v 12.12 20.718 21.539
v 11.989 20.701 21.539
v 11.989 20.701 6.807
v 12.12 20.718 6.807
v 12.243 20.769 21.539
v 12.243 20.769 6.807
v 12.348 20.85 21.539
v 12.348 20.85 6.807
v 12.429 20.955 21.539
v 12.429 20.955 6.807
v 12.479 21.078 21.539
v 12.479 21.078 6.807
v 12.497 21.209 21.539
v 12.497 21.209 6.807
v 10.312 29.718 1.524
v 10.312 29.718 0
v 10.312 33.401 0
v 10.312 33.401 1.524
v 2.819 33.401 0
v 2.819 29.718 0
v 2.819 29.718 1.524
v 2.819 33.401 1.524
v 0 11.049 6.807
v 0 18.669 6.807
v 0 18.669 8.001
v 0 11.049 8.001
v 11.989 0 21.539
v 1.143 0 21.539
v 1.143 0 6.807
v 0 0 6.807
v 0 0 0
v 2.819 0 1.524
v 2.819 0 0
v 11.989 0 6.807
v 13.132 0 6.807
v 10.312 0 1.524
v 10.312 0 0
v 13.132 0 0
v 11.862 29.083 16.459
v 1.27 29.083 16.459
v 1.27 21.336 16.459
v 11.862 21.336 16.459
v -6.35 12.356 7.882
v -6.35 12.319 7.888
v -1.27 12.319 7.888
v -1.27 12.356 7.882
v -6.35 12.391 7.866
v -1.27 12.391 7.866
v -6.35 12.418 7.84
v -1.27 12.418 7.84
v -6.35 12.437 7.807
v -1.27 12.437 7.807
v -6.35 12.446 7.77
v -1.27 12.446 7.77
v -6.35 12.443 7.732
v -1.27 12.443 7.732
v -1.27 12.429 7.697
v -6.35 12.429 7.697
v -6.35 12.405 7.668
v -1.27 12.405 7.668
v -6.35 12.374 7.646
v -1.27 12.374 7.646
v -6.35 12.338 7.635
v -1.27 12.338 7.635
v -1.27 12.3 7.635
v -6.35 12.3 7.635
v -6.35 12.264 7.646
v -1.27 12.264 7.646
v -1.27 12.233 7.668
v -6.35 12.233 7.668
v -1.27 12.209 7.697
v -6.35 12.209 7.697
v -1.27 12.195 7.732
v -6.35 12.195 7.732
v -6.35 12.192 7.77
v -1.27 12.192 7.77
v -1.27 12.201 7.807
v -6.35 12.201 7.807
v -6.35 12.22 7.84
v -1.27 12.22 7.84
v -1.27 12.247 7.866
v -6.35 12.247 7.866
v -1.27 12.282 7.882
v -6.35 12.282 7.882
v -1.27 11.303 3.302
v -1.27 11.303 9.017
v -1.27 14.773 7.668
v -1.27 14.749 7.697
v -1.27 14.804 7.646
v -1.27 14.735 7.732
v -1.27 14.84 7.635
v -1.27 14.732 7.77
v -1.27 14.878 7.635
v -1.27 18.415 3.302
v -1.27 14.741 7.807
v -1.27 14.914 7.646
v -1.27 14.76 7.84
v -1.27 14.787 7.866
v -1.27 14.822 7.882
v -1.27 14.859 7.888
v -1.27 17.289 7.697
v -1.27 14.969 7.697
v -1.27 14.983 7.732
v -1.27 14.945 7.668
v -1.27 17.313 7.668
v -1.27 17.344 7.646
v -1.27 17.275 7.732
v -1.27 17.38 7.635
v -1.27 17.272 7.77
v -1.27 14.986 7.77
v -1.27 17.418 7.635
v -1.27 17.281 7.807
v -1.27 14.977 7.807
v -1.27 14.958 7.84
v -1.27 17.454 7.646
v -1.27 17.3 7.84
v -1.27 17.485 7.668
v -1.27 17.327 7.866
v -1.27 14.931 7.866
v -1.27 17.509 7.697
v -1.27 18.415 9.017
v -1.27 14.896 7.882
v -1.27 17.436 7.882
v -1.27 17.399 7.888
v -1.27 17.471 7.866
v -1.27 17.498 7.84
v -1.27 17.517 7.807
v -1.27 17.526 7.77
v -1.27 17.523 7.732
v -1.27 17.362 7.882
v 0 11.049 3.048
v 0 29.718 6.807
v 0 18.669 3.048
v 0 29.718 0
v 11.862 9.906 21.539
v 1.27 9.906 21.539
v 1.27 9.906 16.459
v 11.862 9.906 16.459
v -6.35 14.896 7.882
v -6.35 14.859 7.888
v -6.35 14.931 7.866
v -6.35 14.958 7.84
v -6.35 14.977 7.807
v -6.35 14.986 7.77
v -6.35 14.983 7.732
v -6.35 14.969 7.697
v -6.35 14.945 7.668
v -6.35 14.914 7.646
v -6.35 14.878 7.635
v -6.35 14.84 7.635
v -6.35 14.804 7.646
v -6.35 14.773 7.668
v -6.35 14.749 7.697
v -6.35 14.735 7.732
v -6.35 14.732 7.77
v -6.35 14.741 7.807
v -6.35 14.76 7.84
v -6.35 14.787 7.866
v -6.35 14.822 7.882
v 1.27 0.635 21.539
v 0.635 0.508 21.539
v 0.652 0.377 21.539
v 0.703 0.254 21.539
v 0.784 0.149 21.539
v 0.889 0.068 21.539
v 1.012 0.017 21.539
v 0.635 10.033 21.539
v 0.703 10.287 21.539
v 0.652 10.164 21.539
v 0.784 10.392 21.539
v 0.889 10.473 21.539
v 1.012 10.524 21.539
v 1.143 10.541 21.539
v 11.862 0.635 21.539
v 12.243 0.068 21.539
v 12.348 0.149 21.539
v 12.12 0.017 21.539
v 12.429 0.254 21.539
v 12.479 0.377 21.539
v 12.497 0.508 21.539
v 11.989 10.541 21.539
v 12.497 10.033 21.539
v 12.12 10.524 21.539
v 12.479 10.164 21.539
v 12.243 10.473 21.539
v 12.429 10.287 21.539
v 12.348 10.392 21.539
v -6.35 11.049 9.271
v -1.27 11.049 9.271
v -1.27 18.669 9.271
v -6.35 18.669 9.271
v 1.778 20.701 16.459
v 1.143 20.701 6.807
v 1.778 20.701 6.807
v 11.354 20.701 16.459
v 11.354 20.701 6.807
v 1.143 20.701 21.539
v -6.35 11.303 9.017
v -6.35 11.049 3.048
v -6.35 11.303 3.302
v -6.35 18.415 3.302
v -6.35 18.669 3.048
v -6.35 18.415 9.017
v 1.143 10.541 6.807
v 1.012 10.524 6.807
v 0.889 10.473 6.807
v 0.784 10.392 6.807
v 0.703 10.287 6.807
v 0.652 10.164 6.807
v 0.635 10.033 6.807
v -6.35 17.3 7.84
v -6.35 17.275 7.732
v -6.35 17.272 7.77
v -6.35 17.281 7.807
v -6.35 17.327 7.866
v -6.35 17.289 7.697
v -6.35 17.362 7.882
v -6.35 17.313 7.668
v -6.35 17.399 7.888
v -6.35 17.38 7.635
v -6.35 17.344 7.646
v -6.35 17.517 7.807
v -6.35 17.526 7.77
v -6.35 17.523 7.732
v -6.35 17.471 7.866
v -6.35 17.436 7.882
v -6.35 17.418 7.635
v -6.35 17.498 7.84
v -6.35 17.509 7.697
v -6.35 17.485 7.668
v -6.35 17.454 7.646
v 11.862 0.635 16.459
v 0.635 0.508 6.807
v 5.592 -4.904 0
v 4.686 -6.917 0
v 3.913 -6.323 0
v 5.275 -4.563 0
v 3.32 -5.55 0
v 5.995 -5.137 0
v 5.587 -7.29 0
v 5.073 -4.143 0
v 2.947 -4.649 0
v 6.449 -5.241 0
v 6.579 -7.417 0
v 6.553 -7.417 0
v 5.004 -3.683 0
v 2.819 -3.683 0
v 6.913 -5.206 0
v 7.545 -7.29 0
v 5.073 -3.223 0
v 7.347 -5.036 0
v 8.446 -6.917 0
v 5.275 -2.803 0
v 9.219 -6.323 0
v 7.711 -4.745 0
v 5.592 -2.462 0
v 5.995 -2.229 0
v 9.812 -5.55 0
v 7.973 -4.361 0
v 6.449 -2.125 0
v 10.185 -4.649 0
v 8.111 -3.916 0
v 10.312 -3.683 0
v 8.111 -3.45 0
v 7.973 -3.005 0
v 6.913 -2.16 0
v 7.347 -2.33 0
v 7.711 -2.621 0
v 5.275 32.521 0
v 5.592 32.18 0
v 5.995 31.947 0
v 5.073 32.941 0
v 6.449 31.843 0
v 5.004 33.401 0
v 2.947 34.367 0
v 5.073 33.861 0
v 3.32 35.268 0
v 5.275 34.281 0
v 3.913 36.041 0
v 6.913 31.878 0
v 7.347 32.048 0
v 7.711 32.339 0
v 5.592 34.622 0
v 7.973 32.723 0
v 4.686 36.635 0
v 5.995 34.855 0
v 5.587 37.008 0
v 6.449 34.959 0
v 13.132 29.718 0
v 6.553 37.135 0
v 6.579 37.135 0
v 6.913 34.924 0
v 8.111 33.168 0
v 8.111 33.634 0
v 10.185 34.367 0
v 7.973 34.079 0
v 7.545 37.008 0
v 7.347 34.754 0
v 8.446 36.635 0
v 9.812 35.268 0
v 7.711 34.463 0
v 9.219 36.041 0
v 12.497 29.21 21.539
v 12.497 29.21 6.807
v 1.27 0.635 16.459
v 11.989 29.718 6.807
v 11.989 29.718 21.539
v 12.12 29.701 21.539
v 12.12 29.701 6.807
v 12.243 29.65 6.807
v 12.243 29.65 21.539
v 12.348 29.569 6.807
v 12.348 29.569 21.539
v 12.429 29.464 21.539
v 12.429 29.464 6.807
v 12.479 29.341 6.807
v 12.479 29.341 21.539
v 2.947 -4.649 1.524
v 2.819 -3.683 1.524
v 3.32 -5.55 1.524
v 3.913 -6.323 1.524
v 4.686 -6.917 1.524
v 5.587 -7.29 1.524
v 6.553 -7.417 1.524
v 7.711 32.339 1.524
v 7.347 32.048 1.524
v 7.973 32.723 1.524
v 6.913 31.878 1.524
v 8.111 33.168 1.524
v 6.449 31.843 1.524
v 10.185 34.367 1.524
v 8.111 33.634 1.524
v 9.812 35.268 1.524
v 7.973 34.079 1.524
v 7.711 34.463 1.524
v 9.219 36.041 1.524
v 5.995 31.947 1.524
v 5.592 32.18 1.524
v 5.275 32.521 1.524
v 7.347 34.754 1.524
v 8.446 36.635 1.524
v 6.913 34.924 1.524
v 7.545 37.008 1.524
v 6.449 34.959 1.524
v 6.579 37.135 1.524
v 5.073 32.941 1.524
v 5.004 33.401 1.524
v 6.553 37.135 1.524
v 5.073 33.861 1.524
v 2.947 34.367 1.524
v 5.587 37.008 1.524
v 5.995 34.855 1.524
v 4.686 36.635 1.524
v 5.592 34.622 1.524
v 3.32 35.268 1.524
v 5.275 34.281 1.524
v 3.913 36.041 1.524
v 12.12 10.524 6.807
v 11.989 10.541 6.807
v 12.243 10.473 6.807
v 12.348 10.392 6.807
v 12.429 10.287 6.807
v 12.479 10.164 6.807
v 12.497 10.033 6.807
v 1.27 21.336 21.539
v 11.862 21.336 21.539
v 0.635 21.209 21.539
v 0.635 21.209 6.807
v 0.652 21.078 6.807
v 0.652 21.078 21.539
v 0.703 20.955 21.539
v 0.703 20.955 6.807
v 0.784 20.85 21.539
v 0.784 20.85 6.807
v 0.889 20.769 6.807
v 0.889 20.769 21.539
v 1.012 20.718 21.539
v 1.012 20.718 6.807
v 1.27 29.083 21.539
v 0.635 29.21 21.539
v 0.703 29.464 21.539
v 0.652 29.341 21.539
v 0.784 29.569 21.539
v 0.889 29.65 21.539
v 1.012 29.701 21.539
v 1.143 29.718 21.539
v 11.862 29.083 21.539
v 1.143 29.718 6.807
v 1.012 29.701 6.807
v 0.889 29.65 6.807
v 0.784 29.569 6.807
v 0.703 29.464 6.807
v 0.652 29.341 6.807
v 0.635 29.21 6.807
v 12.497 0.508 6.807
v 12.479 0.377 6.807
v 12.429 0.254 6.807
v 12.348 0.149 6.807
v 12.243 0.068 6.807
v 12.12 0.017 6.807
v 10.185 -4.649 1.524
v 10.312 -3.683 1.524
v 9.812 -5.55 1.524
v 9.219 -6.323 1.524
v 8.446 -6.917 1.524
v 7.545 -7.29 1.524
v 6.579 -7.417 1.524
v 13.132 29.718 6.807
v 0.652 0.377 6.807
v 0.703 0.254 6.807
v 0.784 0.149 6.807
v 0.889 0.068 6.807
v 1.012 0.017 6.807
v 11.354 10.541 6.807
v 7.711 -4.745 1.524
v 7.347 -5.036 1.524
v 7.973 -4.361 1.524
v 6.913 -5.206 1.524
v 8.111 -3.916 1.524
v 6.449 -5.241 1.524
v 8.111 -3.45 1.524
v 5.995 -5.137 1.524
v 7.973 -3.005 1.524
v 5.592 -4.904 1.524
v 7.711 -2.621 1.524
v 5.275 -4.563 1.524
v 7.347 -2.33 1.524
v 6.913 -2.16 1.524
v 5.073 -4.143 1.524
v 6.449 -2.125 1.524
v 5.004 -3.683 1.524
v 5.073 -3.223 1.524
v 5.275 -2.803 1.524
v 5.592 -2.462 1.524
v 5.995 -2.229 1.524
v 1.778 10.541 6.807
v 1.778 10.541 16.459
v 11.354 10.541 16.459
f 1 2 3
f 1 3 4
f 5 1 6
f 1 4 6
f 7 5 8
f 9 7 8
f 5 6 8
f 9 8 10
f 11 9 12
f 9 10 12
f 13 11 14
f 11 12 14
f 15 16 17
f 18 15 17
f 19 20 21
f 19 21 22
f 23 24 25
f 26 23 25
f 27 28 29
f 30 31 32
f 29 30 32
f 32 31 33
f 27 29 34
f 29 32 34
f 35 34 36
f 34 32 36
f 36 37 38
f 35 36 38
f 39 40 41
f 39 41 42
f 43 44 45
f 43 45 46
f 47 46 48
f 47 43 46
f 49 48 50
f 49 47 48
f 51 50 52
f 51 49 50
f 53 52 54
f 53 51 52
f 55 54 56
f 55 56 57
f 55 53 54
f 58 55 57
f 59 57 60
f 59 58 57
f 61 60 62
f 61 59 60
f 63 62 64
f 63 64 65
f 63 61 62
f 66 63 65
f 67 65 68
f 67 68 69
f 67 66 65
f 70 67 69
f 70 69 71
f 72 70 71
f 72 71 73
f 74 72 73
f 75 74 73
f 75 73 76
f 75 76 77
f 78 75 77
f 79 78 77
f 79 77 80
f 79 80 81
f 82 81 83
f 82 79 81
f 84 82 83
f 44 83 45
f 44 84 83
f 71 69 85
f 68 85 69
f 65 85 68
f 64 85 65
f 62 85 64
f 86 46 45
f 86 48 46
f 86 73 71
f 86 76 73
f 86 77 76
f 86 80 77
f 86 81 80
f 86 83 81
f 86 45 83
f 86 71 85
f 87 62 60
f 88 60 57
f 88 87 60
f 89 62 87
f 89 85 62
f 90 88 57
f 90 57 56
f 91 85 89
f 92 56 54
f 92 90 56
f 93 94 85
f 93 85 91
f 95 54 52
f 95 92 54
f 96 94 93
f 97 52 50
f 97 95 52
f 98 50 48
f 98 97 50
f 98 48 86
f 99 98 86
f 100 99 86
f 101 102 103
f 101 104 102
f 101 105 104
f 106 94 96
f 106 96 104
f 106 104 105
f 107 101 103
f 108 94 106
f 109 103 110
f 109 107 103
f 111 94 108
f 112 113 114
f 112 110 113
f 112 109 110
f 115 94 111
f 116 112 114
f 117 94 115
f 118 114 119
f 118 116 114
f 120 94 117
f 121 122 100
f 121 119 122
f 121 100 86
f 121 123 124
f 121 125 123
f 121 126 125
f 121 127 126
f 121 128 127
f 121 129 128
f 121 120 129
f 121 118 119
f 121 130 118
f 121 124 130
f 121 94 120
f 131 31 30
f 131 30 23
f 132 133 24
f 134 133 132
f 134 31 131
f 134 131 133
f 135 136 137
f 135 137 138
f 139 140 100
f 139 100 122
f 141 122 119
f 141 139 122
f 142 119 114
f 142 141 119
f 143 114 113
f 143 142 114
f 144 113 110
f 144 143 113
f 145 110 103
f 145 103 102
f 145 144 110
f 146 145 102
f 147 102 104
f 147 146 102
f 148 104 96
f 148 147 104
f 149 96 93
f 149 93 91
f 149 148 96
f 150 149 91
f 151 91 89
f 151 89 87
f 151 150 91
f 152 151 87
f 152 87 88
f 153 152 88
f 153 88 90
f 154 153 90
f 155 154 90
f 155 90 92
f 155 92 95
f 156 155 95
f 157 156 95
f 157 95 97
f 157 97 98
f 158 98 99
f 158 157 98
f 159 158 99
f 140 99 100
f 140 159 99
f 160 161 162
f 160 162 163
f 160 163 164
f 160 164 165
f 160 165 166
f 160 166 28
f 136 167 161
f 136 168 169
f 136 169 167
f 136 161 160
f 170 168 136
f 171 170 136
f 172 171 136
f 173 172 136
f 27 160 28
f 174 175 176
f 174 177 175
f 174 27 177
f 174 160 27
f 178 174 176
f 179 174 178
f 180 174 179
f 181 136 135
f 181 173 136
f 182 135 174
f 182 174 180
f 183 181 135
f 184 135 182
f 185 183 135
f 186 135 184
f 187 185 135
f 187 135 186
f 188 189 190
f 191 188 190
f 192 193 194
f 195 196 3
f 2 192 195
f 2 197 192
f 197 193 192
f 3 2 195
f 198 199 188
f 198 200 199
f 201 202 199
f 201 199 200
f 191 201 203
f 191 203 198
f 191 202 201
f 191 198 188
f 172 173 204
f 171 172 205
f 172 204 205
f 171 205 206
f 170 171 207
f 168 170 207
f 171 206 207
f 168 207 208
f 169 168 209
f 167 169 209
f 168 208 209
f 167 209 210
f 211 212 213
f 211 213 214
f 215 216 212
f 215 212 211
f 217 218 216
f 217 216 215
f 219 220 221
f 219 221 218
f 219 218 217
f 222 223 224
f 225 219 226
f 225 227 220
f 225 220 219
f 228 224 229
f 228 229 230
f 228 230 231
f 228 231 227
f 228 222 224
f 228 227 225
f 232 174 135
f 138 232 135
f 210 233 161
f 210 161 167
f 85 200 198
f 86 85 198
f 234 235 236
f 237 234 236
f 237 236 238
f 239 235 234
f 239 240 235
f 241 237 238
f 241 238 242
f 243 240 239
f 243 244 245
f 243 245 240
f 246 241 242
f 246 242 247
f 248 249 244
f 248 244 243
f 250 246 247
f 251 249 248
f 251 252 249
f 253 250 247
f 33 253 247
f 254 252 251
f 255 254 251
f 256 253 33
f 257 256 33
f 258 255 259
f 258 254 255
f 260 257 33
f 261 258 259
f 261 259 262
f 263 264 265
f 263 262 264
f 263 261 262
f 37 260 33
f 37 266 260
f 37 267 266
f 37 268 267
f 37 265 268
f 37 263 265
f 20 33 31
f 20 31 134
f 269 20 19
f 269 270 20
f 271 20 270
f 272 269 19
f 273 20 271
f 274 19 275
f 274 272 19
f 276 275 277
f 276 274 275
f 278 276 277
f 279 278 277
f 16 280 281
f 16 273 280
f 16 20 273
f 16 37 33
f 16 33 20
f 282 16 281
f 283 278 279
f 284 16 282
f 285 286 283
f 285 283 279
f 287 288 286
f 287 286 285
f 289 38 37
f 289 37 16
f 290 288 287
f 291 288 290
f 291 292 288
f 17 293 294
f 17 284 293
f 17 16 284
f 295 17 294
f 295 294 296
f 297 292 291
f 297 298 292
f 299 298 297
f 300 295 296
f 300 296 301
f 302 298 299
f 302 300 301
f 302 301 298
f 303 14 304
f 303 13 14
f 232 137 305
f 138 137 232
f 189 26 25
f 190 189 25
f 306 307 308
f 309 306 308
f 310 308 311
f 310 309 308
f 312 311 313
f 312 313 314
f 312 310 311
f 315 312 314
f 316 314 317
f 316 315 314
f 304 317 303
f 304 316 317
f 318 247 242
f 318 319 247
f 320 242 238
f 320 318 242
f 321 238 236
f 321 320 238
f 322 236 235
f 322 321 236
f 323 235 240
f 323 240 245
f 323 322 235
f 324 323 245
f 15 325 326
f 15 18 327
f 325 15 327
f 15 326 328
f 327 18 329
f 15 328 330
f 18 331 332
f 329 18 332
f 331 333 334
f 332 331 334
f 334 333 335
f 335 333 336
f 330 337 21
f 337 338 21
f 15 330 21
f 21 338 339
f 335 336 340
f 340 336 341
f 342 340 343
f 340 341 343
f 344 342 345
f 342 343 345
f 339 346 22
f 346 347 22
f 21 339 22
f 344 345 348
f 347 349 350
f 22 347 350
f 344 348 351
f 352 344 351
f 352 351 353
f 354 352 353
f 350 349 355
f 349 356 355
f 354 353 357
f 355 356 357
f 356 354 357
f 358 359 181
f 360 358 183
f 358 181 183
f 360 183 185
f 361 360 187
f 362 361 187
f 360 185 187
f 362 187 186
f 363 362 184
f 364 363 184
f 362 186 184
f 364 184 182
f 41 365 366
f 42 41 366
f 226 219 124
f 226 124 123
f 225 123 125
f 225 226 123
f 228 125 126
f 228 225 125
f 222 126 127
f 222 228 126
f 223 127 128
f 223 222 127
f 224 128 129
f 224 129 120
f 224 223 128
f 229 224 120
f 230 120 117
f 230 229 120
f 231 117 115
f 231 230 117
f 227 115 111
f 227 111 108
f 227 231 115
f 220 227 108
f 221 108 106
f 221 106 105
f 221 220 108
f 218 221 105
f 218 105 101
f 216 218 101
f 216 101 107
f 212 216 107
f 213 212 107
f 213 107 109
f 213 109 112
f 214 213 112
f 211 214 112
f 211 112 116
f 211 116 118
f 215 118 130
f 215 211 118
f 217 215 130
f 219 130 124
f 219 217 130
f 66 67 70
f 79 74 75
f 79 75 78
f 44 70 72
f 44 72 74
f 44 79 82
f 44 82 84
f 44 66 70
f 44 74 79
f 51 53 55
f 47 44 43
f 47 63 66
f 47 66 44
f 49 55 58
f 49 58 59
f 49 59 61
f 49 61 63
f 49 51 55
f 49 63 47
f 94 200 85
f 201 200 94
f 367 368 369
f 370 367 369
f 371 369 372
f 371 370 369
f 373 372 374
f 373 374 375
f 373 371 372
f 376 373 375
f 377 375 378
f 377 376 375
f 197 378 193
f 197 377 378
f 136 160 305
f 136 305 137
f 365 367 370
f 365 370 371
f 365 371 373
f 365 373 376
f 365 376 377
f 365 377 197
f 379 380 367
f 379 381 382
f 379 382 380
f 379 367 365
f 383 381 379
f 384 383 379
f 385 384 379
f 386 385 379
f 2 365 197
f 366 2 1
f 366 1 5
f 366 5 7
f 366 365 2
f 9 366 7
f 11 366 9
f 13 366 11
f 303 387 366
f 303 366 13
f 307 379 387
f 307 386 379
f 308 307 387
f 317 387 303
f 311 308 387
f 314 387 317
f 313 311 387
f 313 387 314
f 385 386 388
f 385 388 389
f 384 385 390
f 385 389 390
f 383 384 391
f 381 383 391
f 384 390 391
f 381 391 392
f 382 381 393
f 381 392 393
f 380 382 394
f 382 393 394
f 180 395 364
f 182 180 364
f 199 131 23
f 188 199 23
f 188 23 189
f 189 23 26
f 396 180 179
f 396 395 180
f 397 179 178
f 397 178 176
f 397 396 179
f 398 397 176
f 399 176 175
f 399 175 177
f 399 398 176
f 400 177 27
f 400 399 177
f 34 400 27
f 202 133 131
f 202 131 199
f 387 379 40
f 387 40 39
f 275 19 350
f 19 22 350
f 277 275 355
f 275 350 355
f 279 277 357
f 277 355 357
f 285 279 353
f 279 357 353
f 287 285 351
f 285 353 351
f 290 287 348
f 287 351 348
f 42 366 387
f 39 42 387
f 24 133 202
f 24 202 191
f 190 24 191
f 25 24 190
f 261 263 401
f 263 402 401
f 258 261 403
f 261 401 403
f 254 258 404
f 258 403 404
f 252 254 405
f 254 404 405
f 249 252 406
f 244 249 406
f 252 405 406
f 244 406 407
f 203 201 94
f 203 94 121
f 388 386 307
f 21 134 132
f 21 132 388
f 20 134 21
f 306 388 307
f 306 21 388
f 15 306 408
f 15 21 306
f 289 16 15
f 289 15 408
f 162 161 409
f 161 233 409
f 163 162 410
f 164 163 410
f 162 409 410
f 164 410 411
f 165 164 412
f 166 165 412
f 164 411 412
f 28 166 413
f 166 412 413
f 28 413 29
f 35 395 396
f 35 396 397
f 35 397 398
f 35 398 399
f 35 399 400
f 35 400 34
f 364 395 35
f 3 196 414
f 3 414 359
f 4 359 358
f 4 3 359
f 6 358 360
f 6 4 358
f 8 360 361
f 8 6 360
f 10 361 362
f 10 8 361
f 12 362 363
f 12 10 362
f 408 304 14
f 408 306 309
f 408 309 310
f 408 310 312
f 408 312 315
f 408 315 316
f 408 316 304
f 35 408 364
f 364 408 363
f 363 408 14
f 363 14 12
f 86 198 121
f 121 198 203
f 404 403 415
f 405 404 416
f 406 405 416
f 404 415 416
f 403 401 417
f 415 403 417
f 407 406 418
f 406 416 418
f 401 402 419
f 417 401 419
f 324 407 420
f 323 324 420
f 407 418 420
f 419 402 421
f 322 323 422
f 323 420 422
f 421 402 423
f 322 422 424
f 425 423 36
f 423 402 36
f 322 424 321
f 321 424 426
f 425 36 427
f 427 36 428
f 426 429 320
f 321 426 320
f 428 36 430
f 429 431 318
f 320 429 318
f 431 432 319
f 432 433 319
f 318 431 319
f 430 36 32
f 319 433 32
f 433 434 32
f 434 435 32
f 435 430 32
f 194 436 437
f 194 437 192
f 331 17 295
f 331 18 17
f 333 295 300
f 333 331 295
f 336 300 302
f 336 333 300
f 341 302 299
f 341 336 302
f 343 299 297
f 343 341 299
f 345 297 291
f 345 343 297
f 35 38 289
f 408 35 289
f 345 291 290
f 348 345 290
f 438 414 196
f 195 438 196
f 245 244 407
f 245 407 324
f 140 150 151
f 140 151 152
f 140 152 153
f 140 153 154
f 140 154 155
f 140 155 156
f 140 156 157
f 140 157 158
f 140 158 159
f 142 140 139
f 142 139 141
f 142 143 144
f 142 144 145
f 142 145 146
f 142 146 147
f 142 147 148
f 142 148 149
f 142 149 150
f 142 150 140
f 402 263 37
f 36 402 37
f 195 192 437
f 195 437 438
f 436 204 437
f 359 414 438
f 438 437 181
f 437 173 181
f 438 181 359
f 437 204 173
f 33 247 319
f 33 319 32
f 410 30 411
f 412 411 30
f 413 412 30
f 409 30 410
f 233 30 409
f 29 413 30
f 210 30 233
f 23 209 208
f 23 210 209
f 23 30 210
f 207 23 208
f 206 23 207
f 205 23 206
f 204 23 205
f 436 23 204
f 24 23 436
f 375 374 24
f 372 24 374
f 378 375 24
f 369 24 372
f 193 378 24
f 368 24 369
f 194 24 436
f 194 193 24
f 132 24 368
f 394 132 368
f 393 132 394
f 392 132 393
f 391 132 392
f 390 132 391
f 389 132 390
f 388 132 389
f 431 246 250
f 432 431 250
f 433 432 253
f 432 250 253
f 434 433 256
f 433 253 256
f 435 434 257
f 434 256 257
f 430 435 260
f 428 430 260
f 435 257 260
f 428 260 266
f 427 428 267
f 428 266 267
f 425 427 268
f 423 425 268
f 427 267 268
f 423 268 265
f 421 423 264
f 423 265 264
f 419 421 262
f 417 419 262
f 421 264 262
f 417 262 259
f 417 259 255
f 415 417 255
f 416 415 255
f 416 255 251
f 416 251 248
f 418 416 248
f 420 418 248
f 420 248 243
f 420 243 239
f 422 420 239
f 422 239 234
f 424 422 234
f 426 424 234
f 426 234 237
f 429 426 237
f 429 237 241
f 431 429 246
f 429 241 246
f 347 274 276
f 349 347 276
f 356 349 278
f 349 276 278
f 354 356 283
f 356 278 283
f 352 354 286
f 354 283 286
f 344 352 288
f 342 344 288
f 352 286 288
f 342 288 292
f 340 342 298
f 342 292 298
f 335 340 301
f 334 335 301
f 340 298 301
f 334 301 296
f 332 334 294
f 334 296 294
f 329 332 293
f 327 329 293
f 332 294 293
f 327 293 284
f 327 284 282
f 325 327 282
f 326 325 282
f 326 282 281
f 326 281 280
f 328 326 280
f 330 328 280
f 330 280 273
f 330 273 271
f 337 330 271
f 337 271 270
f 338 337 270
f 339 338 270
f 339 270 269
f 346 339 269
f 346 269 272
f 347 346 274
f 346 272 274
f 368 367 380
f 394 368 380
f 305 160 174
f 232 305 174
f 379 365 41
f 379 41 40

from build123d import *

# Parameters (mm, degrees)
SKETCH1_W          = 13.1318
SKETCH1_H          = 29.718
EXTRUDE1_DEPTH     = 21.5392
SKETCH2_W          = 0.635
SKETCH2_H          = 29.718
CUT_EXTRUDE1_DEPTH = 14.732
SKETCH3_W          = 11.8618
SKETCH3_H          = 10.16
CUT_EXTRUDE2_DEPTH = 5.08
SKETCH5_W          = 1.778
SKETCH5_H          = 10.16
CUT_EXTRUDE3_DEPTH = 36.674017425
FILLET1_R          = 0.508
SKETCH7_W          = 7.493
SKETCH7_H          = 7.4168
EXTRUDE4_DEPTH     = 1.524
FILLET3_R          = 3.7338
SKETCH9_R          = 1.5621
CUT_EXTRUDE4_DEPTH = 1.524
SKETCH11_W         = 10.5918
SKETCH11_H         = 7.747
CUT_EXTRUDE5_DEPTH = 5.08
SKETCH12_W         = 10.5918
SKETCH12_H         = 9.271
CUT_EXTRUDE6_DEPTH = 5.08
SKETCH13_W         = 9.271
SKETCH13_H         = 7.62
EXTRUDE5_DEPTH     = 6.35
CHAMFER1_SIZE      = 1.27
SKETCH14_W         = 6.35
SKETCH14_H         = 7.62
CUT_EXTRUDE7_DEPTH = 3.048
SKETCH15_W         = 1.7272
SKETCH15_H         = 5.969
SKETCH15_W_2       = 5.715
SKETCH15_H_2       = 7.112
SKETCH15_R         = 0.127
CUT_EXTRUDE8_DEPTH = 5.08


with BuildPart() as part:
    # Sketch1 → Extrude1 (new body)
    with BuildSketch(Plane.XY):
        with Locations((6.5659, 14.859)):
            Rectangle(SKETCH1_W, SKETCH1_H)
    extrude(amount=EXTRUDE1_DEPTH)

    # Sketch2 → Cut-Extrude1 (cut)
    with BuildSketch(Plane.XY.offset(21.5392)):
        with Locations((0.3175, 14.859)):
            Rectangle(SKETCH2_W, SKETCH2_H)
        with Locations((12.8143, 14.859)):
            Rectangle(SKETCH2_W, SKETCH2_H)
    extrude(amount=-CUT_EXTRUDE1_DEPTH, mode=Mode.SUBTRACT)

    # Sketch3 → Cut-Extrude2 (cut)
    with BuildSketch(Plane.XY.offset(21.5392)):
        with Locations((6.5659, 15.621)):
            Rectangle(SKETCH3_W, SKETCH3_H)
    extrude(amount=-CUT_EXTRUDE2_DEPTH, mode=Mode.SUBTRACT)

    # Sketch5 → Cut-Extrude3 (cut, through all)
    with BuildSketch(Plane.XY.offset(6.8072)):
        with Locations((0.889, 15.621)):
            Rectangle(SKETCH5_W, SKETCH5_H)
        with Locations((12.2428, 15.621)):
            Rectangle(SKETCH5_W, SKETCH5_H)
    extrude(amount=CUT_EXTRUDE3_DEPTH, mode=Mode.SUBTRACT)

    # Fillet1
    fillet1_edges = [part.edges().sort_by_distance(p)[0] for p in [
        (0.635, 29.718, 14.1732),
        (0.635, 0, 14.1732),
        (12.4968, 0, 14.1732),
        (12.4968, 29.718, 14.1732),
        (12.4968, 20.701, 14.1732),
        (12.4968, 10.541, 14.1732),
        (0.635, 10.541, 14.1732),
        (0.635, 20.701, 14.1732),
    ]]
    fillet(fillet1_edges, radius=FILLET1_R)

    # Sketch7 → Extrude4 (add)
    with BuildSketch(Plane(origin=(0, 0, 0), x_dir=(-1, 0, 0), z_dir=(0, 0, -1))):
        with Locations((-6.5659, 33.4264)):
            Rectangle(SKETCH7_W, SKETCH7_H)
        with Locations((-6.5659, -3.7084)):
            Rectangle(SKETCH7_W, SKETCH7_H)
    extrude(amount=-EXTRUDE4_DEPTH)

    # Fillet3
    fillet3_edges = [part.edges().sort_by_distance(p)[0] for p in [
        (10.3124, 37.1348, 0.762),
        (2.8194, 37.1348, 0.762),
        (10.3124, -7.4168, 0.762),
        (2.8194, -7.4168, 0.762),
    ]]
    fillet(fillet3_edges, radius=FILLET3_R)

    # Sketch9 → Cut-Extrude4 (cut)
    with BuildSketch(Plane(origin=(0, 0, 0), x_dir=(-1, 0, 0), z_dir=(0, 0, -1))):
        with Locations((-6.5659, 33.401)):
            Circle(SKETCH9_R)
        with Locations((-6.5659, -3.683)):
            Circle(SKETCH9_R)
    extrude(amount=-CUT_EXTRUDE4_DEPTH, mode=Mode.SUBTRACT)

    # Sketch11 → Cut-Extrude5 (cut)
    with BuildSketch(Plane.XY.offset(21.5392)):
        with Locations((6.5659, 25.2095)):
            Rectangle(SKETCH11_W, SKETCH11_H)
    extrude(amount=-CUT_EXTRUDE5_DEPTH, mode=Mode.SUBTRACT)

    # Sketch12 → Cut-Extrude6 (cut)
    with BuildSketch(Plane.XY.offset(21.5392)):
        with Locations((6.5659, 5.2705)):
            Rectangle(SKETCH12_W, SKETCH12_H)
    extrude(amount=-CUT_EXTRUDE6_DEPTH, mode=Mode.SUBTRACT)

    # Sketch13 → Extrude5 (add)
    with BuildSketch(Plane.ZY):
        with Locations((4.6355, 14.859)):
            Rectangle(SKETCH13_W, SKETCH13_H)
    extrude(amount=EXTRUDE5_DEPTH)

    # Chamfer1
    chamfer1_edges = [part.edges().sort_by_distance(p)[0] for p in [
        (0, 14.859, 9.271),
    ]]
    chamfer(chamfer1_edges, length=CHAMFER1_SIZE)

    # Sketch14 → Cut-Extrude7 (cut)
    with BuildSketch(Plane(origin=(0, 0, 0), x_dir=(-1, 0, 0), z_dir=(0, 0, -1))):
        with Locations((3.175, 14.859)):
            Rectangle(SKETCH14_W, SKETCH14_H)
    extrude(amount=-CUT_EXTRUDE7_DEPTH, mode=Mode.SUBTRACT)

    # Sketch15 → Cut-Extrude8 (cut)
    # profile 1 of 2: a face of its own
    with BuildSketch(Plane.ZY.offset(6.35)):
        with Locations((3.4036, 24.1935)):
            Rectangle(SKETCH15_W, SKETCH15_H)
    # profile 2 of 2: a face of its own
    with BuildSketch(Plane.ZY.offset(6.35)):
        with Locations((6.1595, 14.859)):
            Rectangle(SKETCH15_W_2, SKETCH15_H_2)
        with Locations((7.76066841, 14.859)):
            Circle(SKETCH15_R, mode=Mode.SUBTRACT)
        with Locations((7.76066841, 17.399)):
            Circle(SKETCH15_R, mode=Mode.SUBTRACT)
        with Locations((7.76066841, 12.319)):
            Circle(SKETCH15_R, mode=Mode.SUBTRACT)
    extrude(amount=-CUT_EXTRUDE8_DEPTH, mode=Mode.SUBTRACT)


solid = part.part
